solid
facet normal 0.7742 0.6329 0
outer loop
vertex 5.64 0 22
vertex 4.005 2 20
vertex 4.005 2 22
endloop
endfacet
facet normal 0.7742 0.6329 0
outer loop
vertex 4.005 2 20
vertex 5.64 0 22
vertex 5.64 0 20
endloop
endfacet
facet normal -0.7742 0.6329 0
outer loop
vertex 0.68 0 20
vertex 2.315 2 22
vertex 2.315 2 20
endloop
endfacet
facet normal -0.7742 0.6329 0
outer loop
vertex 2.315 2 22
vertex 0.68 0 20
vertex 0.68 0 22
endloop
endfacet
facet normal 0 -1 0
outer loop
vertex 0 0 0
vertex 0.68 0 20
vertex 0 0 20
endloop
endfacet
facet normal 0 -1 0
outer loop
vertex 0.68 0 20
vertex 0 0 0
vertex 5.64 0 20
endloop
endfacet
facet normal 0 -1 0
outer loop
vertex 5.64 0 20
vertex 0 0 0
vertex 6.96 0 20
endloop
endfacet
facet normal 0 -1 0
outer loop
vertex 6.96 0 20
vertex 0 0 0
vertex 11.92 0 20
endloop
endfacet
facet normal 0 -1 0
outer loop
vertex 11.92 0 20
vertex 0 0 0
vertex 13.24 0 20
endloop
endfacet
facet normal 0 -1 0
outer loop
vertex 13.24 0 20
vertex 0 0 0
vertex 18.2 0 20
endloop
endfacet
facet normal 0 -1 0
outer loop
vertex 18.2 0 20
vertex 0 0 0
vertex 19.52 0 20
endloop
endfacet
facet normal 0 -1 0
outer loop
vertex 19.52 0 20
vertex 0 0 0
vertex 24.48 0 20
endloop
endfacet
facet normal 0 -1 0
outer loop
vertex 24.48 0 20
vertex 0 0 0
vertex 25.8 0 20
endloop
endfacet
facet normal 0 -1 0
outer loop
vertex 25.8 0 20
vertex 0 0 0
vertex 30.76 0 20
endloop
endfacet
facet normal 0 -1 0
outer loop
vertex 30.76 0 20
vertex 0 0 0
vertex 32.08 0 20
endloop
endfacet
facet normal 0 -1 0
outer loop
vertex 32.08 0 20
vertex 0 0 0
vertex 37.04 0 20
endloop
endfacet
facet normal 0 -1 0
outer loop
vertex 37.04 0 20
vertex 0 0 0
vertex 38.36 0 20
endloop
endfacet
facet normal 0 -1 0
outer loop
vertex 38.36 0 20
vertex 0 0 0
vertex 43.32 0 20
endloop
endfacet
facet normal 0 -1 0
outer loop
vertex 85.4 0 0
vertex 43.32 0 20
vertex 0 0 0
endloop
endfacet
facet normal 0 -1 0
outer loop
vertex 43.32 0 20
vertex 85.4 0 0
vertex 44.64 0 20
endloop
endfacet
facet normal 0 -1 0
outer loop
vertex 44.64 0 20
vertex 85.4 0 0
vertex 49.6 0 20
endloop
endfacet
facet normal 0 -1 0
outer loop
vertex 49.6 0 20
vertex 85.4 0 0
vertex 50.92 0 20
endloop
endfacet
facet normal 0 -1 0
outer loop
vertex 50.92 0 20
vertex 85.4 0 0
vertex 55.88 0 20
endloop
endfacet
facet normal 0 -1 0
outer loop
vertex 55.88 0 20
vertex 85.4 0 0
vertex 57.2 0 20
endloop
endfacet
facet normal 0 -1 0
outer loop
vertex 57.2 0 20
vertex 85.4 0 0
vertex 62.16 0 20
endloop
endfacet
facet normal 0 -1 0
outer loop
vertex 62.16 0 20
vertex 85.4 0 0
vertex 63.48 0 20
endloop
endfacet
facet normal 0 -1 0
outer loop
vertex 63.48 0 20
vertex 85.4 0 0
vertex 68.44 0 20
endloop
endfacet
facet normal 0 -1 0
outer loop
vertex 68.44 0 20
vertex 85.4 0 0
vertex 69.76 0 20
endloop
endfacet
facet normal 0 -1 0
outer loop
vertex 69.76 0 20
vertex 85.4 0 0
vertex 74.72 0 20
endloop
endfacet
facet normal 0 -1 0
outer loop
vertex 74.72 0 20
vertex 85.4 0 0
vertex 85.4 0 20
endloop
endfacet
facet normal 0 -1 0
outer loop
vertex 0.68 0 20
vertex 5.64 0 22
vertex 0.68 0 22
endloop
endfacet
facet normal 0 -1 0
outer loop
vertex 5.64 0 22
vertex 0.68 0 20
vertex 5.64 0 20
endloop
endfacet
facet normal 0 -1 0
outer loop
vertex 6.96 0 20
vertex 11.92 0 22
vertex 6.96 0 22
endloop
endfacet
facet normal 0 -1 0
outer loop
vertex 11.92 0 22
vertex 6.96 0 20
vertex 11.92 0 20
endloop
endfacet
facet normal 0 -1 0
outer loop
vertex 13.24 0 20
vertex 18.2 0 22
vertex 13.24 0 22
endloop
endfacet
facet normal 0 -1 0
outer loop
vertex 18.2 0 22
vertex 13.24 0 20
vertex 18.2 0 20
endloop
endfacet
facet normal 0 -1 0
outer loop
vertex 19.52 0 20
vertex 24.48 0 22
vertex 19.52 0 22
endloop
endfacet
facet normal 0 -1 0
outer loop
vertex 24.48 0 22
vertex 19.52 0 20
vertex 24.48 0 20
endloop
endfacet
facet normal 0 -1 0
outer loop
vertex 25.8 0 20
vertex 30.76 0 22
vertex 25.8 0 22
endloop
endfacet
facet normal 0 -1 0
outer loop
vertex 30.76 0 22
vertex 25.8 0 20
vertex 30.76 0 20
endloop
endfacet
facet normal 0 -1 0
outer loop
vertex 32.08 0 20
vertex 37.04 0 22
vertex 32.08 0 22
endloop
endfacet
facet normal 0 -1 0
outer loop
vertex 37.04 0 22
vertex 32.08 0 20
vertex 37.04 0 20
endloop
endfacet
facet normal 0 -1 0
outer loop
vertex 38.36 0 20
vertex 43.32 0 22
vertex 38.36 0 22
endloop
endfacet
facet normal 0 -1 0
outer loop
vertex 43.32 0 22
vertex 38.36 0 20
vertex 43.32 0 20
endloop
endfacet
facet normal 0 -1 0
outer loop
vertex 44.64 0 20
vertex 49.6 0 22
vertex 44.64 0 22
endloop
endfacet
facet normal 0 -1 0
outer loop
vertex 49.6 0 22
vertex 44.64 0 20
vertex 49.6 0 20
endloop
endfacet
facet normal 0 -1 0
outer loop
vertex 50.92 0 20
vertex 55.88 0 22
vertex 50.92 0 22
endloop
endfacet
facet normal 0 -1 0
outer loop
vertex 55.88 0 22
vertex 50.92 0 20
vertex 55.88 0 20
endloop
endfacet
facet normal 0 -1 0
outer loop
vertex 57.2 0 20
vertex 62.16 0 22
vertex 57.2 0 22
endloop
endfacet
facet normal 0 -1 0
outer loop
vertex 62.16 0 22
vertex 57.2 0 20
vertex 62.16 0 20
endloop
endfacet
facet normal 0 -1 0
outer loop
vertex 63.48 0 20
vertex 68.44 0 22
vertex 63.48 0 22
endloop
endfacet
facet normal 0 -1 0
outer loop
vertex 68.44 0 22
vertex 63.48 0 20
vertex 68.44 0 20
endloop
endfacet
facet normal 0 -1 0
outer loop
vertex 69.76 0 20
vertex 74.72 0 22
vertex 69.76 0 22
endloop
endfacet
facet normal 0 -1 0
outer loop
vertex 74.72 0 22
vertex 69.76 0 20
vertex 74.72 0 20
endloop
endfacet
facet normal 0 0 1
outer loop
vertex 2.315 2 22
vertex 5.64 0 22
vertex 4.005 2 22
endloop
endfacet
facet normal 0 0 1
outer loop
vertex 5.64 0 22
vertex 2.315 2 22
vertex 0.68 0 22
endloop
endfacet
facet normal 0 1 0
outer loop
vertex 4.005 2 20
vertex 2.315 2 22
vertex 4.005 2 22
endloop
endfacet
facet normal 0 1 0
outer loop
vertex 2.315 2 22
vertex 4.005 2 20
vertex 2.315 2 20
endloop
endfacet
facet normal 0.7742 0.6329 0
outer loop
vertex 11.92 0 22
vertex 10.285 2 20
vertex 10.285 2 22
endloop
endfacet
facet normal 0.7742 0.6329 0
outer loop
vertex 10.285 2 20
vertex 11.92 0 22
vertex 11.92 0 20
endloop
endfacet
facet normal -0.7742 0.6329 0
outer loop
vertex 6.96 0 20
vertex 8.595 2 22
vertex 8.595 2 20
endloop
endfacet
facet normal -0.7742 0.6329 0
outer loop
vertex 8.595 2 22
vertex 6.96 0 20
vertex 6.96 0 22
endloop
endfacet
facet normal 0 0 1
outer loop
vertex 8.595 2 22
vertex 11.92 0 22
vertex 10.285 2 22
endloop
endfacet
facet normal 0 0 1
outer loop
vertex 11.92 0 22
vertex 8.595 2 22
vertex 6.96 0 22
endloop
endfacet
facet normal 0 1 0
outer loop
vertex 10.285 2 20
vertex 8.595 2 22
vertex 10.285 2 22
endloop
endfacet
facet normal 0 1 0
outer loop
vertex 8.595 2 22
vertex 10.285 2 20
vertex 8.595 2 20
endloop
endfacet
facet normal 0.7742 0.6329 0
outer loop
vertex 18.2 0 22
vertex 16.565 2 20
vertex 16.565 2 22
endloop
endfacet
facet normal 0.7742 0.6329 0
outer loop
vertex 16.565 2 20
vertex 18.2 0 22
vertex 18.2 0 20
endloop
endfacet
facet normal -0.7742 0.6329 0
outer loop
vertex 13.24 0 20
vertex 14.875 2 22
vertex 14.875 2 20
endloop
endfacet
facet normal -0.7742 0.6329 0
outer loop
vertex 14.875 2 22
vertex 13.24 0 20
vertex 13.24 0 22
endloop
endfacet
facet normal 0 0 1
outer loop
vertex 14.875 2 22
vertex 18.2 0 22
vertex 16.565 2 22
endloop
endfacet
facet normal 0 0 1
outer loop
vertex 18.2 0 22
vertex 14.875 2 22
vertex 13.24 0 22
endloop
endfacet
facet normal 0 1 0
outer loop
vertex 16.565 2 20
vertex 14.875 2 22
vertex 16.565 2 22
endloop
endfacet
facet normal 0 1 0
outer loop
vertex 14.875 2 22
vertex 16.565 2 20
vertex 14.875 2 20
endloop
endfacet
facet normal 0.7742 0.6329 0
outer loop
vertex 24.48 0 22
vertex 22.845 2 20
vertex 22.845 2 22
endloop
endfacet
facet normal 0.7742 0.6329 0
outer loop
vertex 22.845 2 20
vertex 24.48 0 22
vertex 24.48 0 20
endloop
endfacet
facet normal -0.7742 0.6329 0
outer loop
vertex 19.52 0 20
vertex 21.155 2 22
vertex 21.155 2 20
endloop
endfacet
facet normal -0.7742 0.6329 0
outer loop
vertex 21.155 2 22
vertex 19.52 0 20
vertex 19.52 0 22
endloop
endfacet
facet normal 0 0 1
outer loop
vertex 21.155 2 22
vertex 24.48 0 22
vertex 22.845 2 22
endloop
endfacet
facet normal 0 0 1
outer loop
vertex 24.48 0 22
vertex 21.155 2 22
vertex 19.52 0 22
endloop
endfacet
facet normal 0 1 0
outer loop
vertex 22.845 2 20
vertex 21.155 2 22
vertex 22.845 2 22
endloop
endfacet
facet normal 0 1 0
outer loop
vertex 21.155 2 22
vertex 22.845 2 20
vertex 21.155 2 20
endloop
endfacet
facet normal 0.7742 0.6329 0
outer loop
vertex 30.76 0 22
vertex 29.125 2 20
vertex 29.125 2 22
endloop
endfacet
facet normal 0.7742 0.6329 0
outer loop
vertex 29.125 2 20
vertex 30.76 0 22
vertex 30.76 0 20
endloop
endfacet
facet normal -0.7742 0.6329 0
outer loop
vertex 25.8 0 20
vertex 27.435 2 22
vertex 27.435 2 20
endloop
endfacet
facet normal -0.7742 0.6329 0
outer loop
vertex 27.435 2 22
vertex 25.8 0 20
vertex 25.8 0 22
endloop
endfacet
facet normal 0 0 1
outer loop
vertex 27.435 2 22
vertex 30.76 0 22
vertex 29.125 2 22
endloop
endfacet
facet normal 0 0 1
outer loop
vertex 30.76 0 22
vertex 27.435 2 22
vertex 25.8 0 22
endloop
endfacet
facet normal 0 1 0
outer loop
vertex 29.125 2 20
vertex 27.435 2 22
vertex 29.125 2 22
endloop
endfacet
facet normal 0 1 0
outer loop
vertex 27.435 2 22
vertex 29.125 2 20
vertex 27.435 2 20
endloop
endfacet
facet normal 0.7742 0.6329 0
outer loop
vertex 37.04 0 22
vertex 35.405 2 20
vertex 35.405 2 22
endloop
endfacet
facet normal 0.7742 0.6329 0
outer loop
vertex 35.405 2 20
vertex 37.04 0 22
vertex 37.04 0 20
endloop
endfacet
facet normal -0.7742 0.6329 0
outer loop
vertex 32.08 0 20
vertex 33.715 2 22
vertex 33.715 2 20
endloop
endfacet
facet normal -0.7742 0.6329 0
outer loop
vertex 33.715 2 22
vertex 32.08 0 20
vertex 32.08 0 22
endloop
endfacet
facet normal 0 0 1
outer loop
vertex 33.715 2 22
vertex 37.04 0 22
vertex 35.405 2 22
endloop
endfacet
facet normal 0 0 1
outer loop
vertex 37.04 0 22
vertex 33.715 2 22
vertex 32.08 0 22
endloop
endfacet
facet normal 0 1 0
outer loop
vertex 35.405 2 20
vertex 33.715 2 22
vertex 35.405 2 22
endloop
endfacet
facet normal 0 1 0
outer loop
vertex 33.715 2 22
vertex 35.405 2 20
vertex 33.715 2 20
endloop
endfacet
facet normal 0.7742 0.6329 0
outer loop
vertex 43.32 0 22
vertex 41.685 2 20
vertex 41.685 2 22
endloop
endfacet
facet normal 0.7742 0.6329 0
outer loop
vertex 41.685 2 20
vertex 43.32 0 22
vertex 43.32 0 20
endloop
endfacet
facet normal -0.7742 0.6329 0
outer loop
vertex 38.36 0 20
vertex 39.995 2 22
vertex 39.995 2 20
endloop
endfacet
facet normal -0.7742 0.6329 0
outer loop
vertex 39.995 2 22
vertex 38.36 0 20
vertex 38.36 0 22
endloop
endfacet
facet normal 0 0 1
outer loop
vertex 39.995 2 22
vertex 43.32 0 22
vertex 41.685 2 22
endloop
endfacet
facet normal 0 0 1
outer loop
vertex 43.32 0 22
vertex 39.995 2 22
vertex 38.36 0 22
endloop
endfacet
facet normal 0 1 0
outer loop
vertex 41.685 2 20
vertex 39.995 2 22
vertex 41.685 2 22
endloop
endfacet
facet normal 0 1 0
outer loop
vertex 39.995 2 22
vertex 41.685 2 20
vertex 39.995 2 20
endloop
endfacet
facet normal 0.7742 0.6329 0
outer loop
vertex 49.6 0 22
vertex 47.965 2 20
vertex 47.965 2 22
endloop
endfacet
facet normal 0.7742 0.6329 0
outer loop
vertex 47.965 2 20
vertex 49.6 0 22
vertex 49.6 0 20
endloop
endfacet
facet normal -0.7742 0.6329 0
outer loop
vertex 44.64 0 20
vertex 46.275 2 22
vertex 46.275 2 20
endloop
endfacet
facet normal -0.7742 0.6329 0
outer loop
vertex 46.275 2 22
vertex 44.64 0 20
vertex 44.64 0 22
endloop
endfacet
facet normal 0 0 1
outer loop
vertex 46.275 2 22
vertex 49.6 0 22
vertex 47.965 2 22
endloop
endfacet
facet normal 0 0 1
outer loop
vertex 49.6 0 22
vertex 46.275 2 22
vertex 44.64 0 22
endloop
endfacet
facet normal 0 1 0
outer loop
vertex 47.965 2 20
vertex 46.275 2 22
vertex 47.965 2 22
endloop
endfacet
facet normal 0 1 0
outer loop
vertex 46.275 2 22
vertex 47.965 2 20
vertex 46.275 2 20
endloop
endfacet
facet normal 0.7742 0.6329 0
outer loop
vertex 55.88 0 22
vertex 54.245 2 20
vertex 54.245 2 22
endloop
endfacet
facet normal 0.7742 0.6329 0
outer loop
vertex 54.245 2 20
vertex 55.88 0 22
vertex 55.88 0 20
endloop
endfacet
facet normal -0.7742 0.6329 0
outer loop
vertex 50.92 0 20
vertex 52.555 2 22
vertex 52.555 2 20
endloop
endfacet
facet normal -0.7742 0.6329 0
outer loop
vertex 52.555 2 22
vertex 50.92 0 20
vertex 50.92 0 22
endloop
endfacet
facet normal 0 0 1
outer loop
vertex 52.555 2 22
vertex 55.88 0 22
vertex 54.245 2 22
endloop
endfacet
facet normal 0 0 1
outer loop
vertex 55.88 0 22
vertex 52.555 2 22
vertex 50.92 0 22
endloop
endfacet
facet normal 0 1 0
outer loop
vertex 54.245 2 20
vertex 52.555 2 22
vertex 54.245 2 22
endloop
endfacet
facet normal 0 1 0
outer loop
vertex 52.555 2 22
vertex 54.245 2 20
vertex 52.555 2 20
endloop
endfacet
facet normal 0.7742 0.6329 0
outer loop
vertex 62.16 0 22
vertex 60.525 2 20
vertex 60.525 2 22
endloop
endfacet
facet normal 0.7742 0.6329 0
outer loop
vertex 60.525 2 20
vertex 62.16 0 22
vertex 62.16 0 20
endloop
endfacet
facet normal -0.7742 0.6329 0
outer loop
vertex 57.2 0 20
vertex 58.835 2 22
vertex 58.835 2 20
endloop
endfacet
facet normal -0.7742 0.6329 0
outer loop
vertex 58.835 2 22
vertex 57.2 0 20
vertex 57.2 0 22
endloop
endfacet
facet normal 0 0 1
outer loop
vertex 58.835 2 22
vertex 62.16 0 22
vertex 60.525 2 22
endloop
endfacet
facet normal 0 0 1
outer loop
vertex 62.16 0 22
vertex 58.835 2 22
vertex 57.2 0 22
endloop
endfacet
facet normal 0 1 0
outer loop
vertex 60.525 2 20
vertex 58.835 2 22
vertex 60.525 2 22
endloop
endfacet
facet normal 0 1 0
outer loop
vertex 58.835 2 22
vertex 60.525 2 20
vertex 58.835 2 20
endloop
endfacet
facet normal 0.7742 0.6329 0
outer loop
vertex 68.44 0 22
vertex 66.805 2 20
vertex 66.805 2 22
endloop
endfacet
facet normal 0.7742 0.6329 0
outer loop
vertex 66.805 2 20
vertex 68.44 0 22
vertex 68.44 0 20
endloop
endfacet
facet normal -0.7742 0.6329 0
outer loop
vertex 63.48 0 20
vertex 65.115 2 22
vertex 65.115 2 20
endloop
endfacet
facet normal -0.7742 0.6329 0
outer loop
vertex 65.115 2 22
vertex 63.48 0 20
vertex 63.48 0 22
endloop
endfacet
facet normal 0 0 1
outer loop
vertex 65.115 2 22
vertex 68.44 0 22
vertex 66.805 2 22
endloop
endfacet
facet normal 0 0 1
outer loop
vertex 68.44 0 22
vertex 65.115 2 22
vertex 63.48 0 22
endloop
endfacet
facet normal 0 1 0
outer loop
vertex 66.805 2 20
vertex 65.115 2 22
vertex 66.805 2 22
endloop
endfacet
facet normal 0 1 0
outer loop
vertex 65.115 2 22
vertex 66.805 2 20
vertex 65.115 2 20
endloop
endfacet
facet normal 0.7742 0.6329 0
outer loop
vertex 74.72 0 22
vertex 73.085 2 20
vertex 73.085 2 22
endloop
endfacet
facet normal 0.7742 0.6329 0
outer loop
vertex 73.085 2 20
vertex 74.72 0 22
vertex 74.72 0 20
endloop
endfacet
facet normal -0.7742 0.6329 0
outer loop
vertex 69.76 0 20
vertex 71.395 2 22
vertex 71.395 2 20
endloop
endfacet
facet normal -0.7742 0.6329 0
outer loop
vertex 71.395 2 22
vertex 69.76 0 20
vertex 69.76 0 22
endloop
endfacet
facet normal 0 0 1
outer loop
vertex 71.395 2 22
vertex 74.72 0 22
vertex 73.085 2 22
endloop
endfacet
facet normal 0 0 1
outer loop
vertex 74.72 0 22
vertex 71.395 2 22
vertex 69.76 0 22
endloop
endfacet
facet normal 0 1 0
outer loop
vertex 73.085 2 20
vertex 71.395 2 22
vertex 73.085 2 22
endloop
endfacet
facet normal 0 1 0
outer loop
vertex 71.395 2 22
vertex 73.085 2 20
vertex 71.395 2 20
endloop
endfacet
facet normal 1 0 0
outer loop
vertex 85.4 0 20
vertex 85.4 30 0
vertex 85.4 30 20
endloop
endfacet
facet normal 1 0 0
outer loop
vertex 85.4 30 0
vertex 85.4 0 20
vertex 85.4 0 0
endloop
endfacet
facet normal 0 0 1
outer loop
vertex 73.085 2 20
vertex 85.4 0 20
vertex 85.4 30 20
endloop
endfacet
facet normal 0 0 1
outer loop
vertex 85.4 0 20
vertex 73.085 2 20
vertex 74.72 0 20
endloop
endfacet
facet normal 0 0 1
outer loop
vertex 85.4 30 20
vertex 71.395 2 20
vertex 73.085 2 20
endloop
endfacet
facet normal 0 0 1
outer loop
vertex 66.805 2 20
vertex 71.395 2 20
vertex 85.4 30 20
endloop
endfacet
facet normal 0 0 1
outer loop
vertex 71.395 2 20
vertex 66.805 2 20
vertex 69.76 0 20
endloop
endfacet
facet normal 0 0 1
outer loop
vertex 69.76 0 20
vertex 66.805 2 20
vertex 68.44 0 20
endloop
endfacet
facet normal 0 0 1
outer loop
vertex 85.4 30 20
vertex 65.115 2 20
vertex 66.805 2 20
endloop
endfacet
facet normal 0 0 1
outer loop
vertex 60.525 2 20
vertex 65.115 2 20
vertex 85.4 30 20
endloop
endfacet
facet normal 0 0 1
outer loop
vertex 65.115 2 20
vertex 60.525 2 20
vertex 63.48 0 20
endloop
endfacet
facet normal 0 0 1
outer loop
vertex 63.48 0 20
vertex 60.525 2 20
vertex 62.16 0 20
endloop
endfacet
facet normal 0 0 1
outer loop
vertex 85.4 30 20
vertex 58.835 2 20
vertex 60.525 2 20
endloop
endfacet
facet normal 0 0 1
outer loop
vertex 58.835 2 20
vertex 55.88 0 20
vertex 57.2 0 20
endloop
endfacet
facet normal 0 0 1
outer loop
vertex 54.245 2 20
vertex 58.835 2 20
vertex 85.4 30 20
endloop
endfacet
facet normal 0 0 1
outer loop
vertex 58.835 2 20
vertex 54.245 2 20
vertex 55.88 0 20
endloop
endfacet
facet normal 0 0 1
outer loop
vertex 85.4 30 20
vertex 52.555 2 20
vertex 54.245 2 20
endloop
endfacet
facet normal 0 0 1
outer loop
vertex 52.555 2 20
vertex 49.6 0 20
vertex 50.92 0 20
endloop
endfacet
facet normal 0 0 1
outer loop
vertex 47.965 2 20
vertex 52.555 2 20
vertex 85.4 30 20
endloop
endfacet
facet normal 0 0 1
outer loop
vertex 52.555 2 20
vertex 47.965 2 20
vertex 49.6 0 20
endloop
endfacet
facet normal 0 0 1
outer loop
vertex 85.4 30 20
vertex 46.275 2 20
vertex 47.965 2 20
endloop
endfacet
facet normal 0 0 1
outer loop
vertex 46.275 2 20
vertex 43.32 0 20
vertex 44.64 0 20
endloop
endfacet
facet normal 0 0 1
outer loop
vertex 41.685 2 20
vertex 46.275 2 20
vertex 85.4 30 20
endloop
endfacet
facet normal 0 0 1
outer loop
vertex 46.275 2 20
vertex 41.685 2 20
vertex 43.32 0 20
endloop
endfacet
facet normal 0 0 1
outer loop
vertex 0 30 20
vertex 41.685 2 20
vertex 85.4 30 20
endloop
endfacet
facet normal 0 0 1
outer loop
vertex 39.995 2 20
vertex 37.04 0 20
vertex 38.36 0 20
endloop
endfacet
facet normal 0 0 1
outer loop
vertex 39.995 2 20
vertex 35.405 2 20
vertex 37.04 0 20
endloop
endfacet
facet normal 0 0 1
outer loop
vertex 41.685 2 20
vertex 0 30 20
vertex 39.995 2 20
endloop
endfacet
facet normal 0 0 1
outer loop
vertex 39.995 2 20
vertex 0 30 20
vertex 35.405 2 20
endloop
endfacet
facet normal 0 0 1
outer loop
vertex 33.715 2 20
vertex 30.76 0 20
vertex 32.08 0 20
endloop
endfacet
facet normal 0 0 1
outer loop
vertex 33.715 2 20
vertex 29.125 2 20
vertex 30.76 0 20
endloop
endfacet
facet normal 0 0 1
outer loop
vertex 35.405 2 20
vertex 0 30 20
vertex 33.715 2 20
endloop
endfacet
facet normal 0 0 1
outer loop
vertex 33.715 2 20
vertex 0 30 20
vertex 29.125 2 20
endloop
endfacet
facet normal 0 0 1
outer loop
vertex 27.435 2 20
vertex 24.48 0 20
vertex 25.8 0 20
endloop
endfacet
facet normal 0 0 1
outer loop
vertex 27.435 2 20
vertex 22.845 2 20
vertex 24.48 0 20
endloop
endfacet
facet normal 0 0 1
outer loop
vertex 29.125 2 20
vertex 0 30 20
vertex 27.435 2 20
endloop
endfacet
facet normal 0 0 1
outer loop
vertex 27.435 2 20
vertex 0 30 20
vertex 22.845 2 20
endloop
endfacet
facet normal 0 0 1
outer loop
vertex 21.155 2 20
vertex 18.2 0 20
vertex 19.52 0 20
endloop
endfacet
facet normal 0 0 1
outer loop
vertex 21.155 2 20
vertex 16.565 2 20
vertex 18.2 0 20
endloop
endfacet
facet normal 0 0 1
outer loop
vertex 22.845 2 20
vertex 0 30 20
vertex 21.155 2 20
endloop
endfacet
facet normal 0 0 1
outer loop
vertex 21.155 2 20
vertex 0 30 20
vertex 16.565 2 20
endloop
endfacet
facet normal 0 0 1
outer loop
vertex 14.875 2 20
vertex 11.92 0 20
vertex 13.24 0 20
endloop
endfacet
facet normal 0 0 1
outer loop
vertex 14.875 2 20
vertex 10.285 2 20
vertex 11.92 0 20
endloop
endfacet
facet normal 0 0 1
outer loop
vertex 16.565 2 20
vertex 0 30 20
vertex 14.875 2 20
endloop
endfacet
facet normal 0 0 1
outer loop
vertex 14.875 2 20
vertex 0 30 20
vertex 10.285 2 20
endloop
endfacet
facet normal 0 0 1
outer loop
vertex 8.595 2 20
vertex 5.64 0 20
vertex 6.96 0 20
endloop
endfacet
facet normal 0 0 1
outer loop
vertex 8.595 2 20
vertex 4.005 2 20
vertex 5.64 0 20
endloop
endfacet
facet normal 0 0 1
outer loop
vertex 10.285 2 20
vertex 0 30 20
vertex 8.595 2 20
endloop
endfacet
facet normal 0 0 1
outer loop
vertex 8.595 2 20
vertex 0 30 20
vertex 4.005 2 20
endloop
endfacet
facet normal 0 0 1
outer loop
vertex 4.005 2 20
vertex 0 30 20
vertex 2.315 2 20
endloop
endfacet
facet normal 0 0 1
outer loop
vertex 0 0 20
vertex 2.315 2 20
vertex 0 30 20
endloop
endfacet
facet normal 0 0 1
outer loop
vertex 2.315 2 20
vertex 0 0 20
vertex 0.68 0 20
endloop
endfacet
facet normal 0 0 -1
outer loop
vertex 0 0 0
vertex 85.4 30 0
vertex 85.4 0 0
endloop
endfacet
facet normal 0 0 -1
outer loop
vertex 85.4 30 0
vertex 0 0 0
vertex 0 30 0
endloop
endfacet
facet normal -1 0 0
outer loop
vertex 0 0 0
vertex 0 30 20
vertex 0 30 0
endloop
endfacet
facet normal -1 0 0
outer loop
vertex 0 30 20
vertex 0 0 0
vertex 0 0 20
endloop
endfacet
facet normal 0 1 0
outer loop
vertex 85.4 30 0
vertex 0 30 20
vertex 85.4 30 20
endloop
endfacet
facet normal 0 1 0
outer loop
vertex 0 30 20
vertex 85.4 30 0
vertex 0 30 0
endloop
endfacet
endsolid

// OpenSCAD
$fn = 32;

// ----------------------------------------------------------------------
// Gear rack: m=2 z=12, 85.4 x 30 x 22 mm
// ----------------------------------------------------------------------

// --- parameters (mm) ---
bar_len = 85.4;           // rack length, X
bar_w = 30;               // rack width, Y
bar_h = 22;               // overall height, Z
gear_module = 2;          // module
base_t = 20;              // tooth root line height
pitch = 6.28;             // circular pitch
tip_w = 1.69;             // tooth thickness at the tip
root_w = 4.96;            // tooth thickness at the root line
sink = 0.6;               // tooth root overlap into the body

tooth_span = 75.4;

module tooth(x0) {
  /* 20 deg flank profile, sunk into the body for a positive overlap */
  translate([x0, 0, base_t - sink])
    linear_extrude(height = bar_h - base_t + sink)
      polygon(points = [[-root_w / 2, 0], [root_w / 2, 0],
                        [tip_w / 2, bar_h - base_t],
                        [-tip_w / 2, bar_h - base_t]]);
}

difference() {
  union() {
    cube([bar_len, bar_w, base_t]);
    for (i = [0 : 12 - 1])
      tooth((i + 0.5) * pitch + (tooth_span - 12 * pitch) / 2);
  }
}
